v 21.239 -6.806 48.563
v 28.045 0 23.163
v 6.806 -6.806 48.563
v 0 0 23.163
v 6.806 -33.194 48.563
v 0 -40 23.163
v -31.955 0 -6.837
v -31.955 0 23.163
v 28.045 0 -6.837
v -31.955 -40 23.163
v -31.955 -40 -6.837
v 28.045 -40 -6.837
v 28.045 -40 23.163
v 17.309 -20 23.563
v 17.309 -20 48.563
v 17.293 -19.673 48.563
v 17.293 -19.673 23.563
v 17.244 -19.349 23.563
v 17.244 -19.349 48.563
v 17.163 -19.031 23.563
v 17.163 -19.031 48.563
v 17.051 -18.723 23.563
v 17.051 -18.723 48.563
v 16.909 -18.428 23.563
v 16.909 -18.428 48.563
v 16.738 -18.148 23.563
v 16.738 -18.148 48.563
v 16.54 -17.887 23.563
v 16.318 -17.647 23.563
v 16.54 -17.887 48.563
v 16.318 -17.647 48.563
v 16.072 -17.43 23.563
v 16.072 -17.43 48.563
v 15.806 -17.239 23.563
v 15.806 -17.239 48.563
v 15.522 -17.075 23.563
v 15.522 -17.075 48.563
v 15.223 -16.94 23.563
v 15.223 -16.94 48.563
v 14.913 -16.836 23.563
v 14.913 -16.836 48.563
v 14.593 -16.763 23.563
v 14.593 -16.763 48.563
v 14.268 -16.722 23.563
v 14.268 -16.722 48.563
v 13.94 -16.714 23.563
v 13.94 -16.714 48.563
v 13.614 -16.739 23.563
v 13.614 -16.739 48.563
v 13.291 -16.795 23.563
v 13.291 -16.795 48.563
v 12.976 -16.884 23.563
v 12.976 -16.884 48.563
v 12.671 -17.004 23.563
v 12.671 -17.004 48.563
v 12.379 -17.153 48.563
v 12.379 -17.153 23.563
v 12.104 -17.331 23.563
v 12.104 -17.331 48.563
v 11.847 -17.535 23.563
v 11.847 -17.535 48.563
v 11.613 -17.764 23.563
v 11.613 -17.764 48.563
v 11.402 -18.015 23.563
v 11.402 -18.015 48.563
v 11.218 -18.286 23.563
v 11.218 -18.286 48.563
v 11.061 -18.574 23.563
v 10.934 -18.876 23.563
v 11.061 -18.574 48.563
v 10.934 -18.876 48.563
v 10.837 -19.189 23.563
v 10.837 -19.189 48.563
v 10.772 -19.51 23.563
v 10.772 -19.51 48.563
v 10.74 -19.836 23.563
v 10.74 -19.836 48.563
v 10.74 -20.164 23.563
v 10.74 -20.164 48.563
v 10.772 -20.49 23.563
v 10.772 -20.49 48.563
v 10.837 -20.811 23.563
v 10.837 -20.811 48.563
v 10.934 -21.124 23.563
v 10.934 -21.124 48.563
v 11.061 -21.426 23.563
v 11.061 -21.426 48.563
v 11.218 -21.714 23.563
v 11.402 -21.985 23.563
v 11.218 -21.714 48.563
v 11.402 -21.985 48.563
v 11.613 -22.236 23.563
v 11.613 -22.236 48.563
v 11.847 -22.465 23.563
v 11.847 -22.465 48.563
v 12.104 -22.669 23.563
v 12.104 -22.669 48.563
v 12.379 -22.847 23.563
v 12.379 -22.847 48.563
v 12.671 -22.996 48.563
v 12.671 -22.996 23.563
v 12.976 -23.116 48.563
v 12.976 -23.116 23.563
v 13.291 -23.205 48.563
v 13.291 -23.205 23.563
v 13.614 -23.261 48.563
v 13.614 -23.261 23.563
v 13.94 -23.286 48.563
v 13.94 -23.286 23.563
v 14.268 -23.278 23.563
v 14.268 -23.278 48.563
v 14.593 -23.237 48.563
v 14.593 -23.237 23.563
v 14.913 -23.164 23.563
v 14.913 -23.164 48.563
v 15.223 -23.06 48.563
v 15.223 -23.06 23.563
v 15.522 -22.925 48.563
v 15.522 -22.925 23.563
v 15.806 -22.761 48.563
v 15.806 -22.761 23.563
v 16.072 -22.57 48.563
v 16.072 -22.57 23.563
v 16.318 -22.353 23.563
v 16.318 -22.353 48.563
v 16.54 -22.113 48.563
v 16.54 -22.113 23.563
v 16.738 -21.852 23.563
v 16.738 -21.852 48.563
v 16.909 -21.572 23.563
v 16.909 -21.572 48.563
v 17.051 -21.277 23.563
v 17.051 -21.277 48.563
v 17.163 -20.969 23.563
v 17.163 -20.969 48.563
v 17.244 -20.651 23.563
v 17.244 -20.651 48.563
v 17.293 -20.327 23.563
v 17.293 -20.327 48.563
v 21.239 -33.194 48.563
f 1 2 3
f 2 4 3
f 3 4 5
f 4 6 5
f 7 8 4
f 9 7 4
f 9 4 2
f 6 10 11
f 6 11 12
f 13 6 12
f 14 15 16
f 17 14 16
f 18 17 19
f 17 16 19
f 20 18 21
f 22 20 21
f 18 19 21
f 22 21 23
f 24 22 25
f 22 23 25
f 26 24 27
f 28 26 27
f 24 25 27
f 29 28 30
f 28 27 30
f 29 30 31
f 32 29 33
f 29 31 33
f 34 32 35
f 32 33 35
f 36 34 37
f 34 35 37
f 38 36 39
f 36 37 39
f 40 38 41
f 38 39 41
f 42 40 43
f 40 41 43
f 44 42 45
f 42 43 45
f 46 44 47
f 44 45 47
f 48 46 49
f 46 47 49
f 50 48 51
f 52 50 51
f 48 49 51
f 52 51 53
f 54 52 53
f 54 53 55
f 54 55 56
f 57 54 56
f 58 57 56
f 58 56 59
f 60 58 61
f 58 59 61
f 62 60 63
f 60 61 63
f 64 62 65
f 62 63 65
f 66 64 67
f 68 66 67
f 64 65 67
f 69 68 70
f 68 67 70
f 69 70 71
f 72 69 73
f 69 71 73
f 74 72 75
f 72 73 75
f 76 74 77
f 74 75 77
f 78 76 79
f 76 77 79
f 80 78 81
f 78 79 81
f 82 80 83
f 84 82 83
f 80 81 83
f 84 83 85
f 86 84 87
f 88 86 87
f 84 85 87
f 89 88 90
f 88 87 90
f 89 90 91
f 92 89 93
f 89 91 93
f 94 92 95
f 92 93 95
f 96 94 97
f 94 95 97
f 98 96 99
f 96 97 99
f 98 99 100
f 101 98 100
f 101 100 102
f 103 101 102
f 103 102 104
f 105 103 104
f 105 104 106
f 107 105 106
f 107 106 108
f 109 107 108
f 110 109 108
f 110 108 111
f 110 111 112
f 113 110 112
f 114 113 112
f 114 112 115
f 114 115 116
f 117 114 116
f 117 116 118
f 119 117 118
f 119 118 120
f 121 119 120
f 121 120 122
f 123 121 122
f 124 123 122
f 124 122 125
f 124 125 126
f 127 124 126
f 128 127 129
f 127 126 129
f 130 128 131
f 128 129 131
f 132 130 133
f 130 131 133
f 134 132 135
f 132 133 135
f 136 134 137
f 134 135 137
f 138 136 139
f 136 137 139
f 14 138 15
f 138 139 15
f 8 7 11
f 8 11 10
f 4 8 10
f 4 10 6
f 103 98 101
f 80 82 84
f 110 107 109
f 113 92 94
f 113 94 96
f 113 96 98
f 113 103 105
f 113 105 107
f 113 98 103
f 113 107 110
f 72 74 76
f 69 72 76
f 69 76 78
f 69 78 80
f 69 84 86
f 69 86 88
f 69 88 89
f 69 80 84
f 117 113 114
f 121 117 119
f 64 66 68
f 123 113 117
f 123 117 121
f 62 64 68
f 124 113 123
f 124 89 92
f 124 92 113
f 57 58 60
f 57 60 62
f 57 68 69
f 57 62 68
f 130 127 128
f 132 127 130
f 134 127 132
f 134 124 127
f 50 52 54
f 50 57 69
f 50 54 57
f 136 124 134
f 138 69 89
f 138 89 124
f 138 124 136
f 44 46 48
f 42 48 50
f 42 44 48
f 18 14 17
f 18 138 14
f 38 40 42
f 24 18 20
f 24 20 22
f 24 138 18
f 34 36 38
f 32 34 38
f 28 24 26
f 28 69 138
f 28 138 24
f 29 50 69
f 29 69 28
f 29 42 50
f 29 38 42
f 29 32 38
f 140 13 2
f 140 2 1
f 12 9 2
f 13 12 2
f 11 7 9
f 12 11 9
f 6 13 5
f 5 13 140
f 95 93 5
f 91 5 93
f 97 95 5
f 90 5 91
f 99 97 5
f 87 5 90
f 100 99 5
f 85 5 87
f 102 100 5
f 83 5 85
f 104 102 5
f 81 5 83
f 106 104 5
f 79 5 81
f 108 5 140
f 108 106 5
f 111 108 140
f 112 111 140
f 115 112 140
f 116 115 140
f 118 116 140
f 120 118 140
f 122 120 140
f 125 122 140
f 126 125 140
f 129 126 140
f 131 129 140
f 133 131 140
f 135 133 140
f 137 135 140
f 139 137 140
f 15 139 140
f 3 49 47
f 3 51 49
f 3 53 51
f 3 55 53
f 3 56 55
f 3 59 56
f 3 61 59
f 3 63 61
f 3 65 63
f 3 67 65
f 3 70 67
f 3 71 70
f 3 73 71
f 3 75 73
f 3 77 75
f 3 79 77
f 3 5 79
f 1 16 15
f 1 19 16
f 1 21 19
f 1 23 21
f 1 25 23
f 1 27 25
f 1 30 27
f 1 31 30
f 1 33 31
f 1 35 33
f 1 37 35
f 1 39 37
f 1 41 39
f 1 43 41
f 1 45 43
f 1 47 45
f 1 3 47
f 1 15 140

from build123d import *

# Parameters (mm, degrees)
F0_W     = 60
F0_H     = 30
F1_DEPTH = 40
F2_W     = 28.0448670685
F2_H     = 40
F3_DEPTH = 25.4
F3_TAPER = 15
F4_R     = 3.2869844705
F5_DEPTH = 25


# Not quite as in the source:
# - a feature names something its author has since deleted; it is built from what else it names


with BuildPart() as f1:
    # F0 (on Front) → F1 (new body)
    with BuildSketch(Plane.XZ):
        with Locations((-1.9551329315, 8.1626253676)):
            Rectangle(F0_W, F0_H)
    extrude(amount=F1_DEPTH)

    # F2 (on face) → F3 (join)
    with BuildSketch(Plane.XY.offset(23.1626253676)):
        with Locations((14.0224335343, -20)):
            Rectangle(F2_W, F2_H)
    extrude(amount=F3_DEPTH, taper=F3_TAPER)

    # F4 (on face) → F5 (cut)
    with BuildSketch(Plane.XY.offset(48.5626253676)):
        with Locations((14.0224335343, -20)):
            Circle(F4_R)
    extrude(amount=-F5_DEPTH, mode=Mode.SUBTRACT)


solid = f1.part
